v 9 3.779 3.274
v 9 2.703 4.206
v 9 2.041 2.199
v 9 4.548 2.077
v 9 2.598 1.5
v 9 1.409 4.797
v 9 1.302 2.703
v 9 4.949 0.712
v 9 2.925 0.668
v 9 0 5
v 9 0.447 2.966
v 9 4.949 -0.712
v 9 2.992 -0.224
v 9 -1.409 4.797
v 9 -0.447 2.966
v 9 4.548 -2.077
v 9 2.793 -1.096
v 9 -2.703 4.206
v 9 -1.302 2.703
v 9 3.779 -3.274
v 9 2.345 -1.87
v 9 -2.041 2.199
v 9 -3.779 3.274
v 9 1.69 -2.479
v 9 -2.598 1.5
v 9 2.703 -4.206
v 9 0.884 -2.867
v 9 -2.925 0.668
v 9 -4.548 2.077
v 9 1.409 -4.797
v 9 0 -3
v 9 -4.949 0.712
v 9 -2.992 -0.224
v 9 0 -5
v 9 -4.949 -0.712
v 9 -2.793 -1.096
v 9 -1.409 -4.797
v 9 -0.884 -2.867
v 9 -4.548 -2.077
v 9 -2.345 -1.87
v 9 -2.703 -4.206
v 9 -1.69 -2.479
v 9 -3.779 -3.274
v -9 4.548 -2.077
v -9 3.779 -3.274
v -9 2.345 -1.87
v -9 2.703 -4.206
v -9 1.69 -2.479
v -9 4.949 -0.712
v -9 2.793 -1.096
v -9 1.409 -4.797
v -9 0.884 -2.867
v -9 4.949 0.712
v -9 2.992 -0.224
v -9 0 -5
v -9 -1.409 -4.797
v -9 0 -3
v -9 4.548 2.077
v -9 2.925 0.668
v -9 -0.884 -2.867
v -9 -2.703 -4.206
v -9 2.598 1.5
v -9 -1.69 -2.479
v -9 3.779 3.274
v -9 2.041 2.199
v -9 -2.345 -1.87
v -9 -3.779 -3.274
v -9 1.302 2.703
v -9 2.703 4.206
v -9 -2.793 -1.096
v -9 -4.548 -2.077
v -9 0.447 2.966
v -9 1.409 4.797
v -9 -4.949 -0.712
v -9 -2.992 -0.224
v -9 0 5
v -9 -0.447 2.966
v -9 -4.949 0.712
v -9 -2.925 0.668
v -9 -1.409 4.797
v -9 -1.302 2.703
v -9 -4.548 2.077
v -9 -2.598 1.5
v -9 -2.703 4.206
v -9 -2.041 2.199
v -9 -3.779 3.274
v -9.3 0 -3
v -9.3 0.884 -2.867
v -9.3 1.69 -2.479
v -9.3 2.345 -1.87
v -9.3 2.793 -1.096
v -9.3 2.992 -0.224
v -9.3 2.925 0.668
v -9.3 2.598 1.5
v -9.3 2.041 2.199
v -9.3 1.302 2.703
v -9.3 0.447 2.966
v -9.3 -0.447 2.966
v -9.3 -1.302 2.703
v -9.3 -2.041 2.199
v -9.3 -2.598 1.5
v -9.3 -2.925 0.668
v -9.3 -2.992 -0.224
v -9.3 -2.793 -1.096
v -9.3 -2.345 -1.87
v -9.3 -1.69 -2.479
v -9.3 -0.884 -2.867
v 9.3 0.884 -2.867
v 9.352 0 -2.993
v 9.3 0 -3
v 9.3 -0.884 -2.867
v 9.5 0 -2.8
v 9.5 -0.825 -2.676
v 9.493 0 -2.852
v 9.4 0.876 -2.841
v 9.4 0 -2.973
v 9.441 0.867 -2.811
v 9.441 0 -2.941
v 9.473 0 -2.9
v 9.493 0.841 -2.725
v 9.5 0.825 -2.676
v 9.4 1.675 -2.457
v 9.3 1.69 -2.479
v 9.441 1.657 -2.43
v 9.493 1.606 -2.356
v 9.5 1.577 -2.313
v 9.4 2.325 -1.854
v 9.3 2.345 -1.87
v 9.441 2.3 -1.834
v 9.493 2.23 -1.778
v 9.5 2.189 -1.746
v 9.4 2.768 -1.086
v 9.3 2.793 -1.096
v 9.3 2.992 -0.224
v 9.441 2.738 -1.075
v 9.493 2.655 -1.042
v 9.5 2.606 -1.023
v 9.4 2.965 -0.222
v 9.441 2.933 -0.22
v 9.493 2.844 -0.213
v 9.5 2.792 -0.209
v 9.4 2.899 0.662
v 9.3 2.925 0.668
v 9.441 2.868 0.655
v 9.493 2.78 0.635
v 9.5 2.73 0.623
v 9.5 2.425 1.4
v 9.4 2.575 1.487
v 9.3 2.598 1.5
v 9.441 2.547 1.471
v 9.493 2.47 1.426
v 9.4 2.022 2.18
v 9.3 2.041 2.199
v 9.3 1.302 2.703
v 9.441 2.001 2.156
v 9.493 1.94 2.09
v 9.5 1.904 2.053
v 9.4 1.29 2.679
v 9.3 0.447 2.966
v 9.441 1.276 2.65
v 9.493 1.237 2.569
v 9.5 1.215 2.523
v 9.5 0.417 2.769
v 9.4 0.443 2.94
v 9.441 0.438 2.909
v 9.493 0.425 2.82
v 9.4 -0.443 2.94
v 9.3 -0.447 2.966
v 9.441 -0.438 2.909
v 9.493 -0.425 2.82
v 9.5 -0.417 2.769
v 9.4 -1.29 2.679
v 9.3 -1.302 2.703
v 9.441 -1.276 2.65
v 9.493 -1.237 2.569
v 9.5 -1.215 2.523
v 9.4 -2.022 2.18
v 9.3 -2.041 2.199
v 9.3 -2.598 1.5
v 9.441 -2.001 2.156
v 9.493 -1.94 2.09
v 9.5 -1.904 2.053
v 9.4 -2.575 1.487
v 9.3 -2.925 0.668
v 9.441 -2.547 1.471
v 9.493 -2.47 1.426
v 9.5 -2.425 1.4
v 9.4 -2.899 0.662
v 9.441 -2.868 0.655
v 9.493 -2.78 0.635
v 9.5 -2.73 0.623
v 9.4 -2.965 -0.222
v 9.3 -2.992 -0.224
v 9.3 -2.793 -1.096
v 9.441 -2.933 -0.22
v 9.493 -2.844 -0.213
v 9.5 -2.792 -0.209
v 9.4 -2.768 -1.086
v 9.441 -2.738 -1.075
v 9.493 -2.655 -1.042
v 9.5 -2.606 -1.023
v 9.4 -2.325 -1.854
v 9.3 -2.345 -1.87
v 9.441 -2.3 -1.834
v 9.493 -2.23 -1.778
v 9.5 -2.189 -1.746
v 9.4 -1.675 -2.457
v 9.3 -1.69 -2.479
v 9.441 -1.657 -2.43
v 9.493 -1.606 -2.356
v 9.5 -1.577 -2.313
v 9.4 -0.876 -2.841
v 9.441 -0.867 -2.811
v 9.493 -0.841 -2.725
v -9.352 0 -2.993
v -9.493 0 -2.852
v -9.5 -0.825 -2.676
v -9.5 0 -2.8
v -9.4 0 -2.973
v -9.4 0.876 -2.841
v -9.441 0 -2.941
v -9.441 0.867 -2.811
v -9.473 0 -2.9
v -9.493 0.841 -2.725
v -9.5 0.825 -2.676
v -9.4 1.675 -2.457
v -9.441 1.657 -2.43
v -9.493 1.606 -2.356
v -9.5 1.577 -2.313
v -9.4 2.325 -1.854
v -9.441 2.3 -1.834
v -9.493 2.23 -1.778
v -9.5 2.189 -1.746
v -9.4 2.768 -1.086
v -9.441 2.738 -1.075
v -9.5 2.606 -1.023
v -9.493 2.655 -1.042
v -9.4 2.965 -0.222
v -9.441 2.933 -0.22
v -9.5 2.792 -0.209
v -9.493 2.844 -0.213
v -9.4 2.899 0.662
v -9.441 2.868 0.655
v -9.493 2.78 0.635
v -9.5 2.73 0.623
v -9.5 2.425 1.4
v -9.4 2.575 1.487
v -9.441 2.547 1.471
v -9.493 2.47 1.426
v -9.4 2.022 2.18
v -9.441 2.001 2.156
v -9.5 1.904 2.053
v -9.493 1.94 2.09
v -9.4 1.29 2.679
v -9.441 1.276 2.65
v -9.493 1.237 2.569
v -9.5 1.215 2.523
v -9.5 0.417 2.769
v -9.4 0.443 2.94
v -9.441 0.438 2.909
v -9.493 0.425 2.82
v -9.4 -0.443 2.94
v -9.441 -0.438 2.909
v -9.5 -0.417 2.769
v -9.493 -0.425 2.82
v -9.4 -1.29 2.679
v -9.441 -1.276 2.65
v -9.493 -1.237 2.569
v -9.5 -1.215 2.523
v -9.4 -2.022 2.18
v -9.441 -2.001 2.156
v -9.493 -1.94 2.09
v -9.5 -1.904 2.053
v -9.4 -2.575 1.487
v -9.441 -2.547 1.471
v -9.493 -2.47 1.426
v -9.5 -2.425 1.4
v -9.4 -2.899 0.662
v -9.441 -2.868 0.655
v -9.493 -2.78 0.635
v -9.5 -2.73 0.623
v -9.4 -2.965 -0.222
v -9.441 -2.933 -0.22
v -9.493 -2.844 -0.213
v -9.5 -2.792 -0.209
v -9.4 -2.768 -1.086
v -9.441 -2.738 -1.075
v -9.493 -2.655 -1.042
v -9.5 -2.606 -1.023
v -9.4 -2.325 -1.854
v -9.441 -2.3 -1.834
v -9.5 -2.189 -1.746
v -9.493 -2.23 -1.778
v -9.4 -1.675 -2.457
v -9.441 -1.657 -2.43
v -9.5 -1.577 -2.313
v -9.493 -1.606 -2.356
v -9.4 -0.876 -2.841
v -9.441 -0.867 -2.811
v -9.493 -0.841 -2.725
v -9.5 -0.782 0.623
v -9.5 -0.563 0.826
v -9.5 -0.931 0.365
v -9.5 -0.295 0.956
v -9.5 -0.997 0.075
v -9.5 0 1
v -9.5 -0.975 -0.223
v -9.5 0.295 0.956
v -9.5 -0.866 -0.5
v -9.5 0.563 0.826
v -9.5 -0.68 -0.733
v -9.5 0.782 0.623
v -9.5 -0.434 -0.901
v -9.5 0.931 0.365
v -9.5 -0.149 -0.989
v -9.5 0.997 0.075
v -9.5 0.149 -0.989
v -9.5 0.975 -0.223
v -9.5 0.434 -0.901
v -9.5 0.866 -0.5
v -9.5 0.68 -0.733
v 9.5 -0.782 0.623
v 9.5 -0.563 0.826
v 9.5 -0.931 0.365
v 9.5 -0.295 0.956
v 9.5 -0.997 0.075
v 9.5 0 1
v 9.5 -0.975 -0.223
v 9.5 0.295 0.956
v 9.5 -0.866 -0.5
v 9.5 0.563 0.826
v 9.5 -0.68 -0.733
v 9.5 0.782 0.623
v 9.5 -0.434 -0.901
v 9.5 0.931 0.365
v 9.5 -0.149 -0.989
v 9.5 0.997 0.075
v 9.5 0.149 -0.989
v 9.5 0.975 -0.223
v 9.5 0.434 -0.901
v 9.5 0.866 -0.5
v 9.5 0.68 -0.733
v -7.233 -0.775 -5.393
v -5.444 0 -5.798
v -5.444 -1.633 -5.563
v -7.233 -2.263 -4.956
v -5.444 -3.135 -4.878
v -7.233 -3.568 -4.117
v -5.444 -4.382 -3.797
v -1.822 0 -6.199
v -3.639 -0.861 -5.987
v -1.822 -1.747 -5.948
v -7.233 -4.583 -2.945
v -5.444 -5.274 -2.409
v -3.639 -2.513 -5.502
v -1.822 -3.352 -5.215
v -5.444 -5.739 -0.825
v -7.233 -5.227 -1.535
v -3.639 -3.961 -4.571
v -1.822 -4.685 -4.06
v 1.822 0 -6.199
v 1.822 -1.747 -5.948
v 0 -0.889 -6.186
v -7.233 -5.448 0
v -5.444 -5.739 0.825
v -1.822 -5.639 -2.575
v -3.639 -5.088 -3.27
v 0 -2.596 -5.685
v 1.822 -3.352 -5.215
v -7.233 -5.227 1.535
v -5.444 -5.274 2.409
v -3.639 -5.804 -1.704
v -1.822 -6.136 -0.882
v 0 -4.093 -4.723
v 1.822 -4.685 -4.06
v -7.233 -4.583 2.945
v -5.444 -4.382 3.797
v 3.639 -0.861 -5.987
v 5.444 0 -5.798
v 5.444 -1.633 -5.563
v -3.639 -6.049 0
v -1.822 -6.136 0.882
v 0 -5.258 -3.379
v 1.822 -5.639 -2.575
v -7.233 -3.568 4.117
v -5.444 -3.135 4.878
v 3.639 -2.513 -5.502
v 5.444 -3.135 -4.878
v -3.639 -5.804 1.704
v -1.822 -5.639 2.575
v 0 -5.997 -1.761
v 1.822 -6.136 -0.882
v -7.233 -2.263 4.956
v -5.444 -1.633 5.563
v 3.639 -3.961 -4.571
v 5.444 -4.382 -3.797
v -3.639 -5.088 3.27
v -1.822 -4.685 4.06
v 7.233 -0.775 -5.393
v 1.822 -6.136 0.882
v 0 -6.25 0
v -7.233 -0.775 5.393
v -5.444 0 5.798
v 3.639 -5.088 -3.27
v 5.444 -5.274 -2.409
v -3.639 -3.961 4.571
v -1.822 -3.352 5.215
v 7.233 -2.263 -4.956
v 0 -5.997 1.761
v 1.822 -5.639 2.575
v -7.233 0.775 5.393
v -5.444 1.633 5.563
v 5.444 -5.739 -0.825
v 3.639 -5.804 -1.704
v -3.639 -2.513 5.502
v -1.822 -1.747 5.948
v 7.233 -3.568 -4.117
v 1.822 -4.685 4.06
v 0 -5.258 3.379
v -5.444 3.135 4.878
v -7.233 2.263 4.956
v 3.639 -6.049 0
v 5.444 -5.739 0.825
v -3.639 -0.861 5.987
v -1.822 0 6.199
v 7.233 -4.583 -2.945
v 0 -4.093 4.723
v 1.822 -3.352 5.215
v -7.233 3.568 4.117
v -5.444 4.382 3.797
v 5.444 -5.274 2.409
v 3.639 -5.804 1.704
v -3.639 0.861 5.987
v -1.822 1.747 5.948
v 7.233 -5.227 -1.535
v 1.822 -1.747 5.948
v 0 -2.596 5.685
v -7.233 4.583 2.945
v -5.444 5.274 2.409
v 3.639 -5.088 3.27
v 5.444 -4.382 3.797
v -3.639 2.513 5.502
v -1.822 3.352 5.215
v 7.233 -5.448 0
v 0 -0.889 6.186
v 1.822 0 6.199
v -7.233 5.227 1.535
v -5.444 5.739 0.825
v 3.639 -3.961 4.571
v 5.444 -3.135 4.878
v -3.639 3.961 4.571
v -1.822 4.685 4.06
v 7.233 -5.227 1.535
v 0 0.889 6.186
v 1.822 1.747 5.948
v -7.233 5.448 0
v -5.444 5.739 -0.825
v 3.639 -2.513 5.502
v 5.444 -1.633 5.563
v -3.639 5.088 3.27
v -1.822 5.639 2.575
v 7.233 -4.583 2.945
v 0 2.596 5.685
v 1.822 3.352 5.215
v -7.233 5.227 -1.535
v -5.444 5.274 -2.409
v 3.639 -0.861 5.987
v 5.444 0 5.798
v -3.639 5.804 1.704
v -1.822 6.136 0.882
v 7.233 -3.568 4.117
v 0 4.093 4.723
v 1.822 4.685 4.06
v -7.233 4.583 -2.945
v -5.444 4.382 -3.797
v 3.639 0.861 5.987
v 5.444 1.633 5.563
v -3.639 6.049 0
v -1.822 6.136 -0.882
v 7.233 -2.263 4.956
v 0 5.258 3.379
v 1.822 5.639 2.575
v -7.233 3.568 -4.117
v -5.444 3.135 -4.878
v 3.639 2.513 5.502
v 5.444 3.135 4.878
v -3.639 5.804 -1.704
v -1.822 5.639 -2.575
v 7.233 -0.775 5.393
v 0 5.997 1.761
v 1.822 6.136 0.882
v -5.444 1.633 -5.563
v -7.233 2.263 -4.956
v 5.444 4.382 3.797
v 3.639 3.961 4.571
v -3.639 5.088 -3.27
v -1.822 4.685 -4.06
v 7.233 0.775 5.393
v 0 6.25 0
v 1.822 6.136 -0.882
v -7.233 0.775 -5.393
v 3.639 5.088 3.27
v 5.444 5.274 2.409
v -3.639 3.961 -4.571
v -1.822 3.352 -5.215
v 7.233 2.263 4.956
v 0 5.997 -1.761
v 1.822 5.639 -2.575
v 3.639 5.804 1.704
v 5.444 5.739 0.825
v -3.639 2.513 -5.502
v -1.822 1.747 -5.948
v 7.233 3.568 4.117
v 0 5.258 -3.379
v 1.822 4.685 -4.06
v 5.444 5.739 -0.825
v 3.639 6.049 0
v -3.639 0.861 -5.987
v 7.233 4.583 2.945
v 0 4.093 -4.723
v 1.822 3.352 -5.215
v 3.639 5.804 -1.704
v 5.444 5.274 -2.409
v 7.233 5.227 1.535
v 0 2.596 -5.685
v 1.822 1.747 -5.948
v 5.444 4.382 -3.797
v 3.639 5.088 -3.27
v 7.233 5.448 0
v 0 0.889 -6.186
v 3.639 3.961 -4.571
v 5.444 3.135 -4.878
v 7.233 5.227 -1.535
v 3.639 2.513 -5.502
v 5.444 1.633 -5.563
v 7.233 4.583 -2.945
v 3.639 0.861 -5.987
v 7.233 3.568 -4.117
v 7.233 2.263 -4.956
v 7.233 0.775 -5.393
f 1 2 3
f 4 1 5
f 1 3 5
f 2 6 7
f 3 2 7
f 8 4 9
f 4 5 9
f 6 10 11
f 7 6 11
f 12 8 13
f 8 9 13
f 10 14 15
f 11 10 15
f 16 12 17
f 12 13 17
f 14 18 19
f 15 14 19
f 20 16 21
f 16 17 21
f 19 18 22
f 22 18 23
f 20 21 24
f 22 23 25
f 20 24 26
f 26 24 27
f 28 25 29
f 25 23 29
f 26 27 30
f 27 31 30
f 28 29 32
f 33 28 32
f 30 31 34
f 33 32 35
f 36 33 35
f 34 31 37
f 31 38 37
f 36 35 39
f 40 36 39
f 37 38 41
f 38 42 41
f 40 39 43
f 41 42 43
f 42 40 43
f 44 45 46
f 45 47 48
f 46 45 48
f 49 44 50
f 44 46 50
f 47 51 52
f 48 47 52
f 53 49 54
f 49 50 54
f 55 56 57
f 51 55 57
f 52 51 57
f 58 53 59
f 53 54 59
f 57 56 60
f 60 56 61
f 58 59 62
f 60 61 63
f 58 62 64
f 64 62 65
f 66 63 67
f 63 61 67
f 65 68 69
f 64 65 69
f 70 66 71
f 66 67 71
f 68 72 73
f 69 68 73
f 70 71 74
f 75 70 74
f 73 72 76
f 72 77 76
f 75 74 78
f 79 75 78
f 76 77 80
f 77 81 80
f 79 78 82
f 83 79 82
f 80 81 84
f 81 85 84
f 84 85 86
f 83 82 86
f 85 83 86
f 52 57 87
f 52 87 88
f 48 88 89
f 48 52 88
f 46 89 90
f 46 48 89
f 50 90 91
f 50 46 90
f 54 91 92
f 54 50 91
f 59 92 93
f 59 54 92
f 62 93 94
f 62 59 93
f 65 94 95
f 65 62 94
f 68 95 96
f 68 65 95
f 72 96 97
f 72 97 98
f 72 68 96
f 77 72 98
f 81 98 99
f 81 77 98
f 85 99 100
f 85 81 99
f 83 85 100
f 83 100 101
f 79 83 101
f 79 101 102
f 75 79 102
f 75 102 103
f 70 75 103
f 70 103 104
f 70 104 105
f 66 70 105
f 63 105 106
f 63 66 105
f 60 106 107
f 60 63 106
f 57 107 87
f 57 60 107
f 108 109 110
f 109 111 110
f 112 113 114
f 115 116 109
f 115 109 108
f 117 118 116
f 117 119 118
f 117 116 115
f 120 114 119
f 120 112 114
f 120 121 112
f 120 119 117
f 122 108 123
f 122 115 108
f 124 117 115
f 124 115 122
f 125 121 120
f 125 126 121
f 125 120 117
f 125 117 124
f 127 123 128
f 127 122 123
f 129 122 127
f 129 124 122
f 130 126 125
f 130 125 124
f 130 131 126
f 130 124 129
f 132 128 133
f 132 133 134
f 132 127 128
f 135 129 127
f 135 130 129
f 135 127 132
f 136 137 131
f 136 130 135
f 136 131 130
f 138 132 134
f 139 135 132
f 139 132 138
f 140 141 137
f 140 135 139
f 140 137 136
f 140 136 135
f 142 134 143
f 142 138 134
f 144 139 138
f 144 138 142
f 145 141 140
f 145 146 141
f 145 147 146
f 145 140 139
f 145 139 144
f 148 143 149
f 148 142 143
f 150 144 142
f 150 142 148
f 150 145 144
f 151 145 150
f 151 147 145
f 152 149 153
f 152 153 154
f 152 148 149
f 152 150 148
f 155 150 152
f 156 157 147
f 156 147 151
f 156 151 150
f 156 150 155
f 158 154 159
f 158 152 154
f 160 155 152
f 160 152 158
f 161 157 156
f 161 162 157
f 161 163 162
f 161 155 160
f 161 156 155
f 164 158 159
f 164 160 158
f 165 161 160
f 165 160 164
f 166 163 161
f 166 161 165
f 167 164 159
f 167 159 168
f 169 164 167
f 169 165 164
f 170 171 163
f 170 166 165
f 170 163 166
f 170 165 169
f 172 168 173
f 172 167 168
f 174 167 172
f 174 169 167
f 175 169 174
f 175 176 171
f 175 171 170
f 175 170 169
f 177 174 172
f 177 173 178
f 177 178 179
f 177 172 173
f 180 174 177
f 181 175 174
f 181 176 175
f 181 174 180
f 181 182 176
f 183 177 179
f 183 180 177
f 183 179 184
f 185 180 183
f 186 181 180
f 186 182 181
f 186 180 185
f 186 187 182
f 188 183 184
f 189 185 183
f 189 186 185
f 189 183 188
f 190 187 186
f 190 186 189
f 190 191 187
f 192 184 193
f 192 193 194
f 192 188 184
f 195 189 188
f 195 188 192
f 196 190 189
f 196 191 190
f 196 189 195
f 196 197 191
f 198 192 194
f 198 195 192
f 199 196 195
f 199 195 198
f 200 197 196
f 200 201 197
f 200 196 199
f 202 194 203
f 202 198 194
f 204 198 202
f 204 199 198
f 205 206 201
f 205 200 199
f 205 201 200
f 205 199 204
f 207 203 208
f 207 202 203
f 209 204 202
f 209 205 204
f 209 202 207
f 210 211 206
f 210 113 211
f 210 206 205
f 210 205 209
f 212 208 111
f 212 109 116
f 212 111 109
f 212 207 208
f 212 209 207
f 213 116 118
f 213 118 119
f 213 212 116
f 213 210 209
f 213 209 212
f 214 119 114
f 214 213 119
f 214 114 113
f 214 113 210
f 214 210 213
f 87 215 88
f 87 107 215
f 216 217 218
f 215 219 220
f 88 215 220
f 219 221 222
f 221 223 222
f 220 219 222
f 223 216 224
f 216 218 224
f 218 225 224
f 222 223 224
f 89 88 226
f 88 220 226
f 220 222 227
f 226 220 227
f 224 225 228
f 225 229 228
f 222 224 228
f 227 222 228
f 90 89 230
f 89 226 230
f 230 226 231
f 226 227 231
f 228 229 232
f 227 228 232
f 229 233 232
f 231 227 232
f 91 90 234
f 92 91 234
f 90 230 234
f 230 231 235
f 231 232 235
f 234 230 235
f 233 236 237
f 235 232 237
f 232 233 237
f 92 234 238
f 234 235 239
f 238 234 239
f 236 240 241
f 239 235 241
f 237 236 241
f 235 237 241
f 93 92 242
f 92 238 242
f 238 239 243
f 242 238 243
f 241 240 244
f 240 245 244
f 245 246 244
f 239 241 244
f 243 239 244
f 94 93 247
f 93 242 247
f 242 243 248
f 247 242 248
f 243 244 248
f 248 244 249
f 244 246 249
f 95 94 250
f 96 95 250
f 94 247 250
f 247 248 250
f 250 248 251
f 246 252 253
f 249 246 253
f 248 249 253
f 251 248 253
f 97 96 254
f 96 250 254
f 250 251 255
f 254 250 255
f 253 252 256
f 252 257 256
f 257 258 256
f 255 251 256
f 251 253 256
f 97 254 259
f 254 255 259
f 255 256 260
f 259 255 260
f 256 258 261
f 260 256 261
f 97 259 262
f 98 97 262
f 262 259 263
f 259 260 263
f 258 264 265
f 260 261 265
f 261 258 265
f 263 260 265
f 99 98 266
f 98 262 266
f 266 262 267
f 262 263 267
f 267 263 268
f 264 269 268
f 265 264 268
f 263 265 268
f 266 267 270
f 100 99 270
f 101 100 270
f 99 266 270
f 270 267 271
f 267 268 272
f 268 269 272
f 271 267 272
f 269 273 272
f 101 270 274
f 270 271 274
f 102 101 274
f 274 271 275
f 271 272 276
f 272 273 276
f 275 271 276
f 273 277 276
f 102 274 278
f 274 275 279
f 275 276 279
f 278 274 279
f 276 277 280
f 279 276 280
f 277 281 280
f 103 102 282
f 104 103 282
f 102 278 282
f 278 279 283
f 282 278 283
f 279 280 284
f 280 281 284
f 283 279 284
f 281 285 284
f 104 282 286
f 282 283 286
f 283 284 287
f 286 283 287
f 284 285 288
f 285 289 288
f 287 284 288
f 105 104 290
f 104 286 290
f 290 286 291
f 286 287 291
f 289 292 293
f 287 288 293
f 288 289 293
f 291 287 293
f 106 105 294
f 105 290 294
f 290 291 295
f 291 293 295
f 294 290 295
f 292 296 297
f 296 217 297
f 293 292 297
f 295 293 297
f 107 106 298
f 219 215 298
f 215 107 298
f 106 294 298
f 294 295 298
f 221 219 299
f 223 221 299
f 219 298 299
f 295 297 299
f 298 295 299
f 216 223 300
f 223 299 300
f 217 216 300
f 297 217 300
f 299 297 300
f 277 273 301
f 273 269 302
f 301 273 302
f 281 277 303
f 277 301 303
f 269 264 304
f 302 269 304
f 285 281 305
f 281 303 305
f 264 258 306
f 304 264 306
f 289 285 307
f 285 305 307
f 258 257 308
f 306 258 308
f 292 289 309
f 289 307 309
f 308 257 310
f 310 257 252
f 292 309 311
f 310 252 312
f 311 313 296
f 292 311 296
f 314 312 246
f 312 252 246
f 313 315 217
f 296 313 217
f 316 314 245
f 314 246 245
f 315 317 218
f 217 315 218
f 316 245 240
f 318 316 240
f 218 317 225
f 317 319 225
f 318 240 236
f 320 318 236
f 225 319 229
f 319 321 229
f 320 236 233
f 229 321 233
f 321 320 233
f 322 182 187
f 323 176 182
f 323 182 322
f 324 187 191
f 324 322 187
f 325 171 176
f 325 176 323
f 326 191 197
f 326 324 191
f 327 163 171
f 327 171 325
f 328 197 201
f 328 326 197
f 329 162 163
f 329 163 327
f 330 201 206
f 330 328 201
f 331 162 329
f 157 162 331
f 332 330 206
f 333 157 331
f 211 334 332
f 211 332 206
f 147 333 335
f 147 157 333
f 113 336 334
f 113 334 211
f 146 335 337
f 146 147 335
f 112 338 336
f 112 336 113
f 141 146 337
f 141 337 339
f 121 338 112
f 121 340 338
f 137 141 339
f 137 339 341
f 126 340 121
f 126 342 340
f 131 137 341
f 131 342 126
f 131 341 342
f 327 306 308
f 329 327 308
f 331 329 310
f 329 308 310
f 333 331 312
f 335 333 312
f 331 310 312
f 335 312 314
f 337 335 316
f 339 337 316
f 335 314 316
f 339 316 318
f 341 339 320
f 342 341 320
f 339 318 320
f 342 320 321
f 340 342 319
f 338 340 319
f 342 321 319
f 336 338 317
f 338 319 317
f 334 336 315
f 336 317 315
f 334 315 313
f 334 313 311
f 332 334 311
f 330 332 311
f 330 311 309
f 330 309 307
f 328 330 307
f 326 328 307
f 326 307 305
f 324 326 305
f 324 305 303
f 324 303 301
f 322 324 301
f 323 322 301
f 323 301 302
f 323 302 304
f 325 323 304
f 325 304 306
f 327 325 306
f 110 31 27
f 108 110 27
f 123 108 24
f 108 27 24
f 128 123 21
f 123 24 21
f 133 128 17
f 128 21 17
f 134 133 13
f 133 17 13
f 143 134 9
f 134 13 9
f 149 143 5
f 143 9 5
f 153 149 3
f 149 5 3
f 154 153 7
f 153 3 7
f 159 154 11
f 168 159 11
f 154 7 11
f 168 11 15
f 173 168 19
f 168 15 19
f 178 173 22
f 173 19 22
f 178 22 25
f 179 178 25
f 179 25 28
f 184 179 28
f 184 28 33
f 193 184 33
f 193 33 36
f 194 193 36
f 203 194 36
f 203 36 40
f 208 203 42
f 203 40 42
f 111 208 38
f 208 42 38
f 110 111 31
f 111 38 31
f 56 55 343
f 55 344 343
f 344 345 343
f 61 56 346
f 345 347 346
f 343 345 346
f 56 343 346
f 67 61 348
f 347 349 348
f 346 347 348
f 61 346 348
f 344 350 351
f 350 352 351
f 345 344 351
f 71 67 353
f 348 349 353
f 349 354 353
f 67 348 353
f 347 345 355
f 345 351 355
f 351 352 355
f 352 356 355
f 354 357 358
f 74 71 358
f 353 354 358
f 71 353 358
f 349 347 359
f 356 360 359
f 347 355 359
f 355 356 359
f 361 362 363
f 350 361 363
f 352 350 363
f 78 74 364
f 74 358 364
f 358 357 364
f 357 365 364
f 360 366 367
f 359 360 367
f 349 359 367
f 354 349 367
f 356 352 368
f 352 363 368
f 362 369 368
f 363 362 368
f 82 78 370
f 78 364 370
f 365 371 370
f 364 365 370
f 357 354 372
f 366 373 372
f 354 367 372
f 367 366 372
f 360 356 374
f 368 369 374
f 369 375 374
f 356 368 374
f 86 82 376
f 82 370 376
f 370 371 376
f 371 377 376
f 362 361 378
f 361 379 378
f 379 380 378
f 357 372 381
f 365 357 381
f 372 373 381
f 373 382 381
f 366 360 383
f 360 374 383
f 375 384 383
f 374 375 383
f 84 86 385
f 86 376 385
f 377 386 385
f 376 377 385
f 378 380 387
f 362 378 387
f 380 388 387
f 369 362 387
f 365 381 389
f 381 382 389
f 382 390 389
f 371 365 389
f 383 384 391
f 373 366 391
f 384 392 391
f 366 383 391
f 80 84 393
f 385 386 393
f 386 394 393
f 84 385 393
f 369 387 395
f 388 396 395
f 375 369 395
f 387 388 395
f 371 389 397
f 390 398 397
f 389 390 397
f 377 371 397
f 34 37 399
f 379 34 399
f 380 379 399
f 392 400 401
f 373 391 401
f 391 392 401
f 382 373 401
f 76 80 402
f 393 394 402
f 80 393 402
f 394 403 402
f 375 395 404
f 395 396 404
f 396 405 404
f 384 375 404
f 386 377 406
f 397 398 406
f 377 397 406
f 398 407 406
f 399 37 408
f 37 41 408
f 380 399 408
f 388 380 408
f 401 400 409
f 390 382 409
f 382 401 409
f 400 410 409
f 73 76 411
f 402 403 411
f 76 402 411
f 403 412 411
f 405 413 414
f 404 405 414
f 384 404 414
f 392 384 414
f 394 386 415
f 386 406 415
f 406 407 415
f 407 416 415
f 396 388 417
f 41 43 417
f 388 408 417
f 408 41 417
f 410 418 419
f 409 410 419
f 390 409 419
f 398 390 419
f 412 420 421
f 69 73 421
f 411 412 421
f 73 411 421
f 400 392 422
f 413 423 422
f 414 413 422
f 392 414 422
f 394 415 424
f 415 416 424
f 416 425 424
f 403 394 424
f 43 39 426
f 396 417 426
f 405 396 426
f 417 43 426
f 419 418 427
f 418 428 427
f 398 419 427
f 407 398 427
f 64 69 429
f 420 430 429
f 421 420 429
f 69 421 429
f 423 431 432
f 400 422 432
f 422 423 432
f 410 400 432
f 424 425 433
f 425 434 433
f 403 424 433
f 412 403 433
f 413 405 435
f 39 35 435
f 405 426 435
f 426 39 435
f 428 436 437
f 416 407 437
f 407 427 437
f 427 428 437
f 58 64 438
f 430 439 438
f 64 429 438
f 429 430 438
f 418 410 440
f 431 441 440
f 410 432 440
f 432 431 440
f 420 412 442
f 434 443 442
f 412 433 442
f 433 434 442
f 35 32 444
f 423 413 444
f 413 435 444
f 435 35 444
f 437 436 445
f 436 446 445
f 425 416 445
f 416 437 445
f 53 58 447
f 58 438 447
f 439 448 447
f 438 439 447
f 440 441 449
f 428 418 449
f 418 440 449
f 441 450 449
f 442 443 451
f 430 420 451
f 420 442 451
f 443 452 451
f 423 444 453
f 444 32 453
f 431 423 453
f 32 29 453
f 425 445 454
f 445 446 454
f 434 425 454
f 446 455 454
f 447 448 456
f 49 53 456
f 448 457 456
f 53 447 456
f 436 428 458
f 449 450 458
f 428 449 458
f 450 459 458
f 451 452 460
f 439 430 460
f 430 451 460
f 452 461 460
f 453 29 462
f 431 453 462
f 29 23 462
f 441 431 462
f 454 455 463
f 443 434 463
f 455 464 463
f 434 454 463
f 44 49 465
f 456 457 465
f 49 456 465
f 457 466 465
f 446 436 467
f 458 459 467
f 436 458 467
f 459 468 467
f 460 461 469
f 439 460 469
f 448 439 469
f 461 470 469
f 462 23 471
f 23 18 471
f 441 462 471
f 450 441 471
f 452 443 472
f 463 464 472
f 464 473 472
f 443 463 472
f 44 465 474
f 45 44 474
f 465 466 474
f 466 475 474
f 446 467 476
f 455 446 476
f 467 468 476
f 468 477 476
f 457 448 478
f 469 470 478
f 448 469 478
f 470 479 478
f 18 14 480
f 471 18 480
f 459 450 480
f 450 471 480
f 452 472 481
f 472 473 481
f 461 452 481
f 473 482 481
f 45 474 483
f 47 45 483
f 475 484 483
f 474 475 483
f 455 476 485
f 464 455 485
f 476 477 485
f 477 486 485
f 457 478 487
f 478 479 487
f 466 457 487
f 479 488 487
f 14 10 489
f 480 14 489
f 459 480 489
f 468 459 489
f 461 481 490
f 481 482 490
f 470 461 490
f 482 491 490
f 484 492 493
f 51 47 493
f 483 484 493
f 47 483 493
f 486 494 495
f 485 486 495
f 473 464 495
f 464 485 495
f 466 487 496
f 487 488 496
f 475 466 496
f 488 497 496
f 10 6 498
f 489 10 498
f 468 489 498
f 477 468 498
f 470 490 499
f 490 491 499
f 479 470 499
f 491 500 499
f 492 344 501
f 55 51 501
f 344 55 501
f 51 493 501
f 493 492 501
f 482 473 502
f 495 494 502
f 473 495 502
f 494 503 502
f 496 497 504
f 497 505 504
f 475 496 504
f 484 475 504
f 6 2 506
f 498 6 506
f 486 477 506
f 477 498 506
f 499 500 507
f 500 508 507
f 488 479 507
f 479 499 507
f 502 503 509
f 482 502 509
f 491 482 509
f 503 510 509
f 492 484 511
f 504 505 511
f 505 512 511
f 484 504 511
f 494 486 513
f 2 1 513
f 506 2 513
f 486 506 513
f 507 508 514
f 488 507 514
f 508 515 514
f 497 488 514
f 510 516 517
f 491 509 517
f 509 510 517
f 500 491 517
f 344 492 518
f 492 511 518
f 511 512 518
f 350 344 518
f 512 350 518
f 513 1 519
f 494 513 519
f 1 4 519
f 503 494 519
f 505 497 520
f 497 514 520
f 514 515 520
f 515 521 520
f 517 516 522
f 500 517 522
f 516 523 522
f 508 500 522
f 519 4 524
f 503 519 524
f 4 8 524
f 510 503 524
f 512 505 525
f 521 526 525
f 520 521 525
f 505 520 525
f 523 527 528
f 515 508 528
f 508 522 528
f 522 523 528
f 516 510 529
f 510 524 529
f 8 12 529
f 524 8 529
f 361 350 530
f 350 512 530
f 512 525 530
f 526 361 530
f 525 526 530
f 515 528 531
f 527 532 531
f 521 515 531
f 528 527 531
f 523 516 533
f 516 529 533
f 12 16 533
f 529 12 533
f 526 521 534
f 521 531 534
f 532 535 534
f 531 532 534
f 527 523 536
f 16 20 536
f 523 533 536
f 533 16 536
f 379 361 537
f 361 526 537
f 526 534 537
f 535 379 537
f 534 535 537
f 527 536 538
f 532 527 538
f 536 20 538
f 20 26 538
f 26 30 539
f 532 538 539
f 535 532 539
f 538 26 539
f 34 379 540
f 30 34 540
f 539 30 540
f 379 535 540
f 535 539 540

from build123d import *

# Parameters (mm, degrees)
SKETCH3_R           = 3
BOSS_EXTRUDE1_DEPTH = 0.5
SKETCH4_R           = 1
CUT_EXTRUDE2_DEPTH  = 20
FILLET1_R           = 0.2


with BuildPart() as part:
    # Sketch1 → Revolve1 (revolve)
    with BuildSketch(Plane(origin=(0, 0, 0), x_dir=(1, 0, 0), z_dir=(0, 1, 0))):
        with BuildLine():
            Line((0, 0), (-9, 0))
            Line((-9, 0), (-9, 5))
            ThreePointArc((-9, 5), (0, 6.249672879), (9, 5))
            Line((9, 5), (9, 0))
            Line((9, 0), (0, 0))
        make_face()
    revolve(axis=Axis((0, 0, 0), (-1, 0, 0)))

    # Sketch3 → Boss-Extrude1 (add)
    with BuildSketch(Plane(origin=(9, 0, 0), x_dir=(0, 0, -1), z_dir=(1, 0, 0))):
        Circle(SKETCH3_R)
    boss_extrude1 = extrude(amount=BOSS_EXTRUDE1_DEPTH)

    # Mirror1: Boss-Extrude1 across plane
    add(boss_extrude1.mirror(Plane(origin=(0, 0, 0), x_dir=(0, 0, 1), z_dir=(1, 0, 0))))

    # Sketch4 → Cut-Extrude2 (cut, through all)
    with BuildSketch(Plane.ZY.offset(9.5)):
        Circle(SKETCH4_R)
    extrude(amount=-CUT_EXTRUDE2_DEPTH, mode=Mode.SUBTRACT)

    # Fillet1
    fillet1_edges = [part.edges().sort_by_distance(p)[0] for p in [
        (9.5, 0, 3),
        (-9.5, 0, 3),
    ]]
    fillet(fillet1_edges, radius=FILLET1_R)


solid = part.part
